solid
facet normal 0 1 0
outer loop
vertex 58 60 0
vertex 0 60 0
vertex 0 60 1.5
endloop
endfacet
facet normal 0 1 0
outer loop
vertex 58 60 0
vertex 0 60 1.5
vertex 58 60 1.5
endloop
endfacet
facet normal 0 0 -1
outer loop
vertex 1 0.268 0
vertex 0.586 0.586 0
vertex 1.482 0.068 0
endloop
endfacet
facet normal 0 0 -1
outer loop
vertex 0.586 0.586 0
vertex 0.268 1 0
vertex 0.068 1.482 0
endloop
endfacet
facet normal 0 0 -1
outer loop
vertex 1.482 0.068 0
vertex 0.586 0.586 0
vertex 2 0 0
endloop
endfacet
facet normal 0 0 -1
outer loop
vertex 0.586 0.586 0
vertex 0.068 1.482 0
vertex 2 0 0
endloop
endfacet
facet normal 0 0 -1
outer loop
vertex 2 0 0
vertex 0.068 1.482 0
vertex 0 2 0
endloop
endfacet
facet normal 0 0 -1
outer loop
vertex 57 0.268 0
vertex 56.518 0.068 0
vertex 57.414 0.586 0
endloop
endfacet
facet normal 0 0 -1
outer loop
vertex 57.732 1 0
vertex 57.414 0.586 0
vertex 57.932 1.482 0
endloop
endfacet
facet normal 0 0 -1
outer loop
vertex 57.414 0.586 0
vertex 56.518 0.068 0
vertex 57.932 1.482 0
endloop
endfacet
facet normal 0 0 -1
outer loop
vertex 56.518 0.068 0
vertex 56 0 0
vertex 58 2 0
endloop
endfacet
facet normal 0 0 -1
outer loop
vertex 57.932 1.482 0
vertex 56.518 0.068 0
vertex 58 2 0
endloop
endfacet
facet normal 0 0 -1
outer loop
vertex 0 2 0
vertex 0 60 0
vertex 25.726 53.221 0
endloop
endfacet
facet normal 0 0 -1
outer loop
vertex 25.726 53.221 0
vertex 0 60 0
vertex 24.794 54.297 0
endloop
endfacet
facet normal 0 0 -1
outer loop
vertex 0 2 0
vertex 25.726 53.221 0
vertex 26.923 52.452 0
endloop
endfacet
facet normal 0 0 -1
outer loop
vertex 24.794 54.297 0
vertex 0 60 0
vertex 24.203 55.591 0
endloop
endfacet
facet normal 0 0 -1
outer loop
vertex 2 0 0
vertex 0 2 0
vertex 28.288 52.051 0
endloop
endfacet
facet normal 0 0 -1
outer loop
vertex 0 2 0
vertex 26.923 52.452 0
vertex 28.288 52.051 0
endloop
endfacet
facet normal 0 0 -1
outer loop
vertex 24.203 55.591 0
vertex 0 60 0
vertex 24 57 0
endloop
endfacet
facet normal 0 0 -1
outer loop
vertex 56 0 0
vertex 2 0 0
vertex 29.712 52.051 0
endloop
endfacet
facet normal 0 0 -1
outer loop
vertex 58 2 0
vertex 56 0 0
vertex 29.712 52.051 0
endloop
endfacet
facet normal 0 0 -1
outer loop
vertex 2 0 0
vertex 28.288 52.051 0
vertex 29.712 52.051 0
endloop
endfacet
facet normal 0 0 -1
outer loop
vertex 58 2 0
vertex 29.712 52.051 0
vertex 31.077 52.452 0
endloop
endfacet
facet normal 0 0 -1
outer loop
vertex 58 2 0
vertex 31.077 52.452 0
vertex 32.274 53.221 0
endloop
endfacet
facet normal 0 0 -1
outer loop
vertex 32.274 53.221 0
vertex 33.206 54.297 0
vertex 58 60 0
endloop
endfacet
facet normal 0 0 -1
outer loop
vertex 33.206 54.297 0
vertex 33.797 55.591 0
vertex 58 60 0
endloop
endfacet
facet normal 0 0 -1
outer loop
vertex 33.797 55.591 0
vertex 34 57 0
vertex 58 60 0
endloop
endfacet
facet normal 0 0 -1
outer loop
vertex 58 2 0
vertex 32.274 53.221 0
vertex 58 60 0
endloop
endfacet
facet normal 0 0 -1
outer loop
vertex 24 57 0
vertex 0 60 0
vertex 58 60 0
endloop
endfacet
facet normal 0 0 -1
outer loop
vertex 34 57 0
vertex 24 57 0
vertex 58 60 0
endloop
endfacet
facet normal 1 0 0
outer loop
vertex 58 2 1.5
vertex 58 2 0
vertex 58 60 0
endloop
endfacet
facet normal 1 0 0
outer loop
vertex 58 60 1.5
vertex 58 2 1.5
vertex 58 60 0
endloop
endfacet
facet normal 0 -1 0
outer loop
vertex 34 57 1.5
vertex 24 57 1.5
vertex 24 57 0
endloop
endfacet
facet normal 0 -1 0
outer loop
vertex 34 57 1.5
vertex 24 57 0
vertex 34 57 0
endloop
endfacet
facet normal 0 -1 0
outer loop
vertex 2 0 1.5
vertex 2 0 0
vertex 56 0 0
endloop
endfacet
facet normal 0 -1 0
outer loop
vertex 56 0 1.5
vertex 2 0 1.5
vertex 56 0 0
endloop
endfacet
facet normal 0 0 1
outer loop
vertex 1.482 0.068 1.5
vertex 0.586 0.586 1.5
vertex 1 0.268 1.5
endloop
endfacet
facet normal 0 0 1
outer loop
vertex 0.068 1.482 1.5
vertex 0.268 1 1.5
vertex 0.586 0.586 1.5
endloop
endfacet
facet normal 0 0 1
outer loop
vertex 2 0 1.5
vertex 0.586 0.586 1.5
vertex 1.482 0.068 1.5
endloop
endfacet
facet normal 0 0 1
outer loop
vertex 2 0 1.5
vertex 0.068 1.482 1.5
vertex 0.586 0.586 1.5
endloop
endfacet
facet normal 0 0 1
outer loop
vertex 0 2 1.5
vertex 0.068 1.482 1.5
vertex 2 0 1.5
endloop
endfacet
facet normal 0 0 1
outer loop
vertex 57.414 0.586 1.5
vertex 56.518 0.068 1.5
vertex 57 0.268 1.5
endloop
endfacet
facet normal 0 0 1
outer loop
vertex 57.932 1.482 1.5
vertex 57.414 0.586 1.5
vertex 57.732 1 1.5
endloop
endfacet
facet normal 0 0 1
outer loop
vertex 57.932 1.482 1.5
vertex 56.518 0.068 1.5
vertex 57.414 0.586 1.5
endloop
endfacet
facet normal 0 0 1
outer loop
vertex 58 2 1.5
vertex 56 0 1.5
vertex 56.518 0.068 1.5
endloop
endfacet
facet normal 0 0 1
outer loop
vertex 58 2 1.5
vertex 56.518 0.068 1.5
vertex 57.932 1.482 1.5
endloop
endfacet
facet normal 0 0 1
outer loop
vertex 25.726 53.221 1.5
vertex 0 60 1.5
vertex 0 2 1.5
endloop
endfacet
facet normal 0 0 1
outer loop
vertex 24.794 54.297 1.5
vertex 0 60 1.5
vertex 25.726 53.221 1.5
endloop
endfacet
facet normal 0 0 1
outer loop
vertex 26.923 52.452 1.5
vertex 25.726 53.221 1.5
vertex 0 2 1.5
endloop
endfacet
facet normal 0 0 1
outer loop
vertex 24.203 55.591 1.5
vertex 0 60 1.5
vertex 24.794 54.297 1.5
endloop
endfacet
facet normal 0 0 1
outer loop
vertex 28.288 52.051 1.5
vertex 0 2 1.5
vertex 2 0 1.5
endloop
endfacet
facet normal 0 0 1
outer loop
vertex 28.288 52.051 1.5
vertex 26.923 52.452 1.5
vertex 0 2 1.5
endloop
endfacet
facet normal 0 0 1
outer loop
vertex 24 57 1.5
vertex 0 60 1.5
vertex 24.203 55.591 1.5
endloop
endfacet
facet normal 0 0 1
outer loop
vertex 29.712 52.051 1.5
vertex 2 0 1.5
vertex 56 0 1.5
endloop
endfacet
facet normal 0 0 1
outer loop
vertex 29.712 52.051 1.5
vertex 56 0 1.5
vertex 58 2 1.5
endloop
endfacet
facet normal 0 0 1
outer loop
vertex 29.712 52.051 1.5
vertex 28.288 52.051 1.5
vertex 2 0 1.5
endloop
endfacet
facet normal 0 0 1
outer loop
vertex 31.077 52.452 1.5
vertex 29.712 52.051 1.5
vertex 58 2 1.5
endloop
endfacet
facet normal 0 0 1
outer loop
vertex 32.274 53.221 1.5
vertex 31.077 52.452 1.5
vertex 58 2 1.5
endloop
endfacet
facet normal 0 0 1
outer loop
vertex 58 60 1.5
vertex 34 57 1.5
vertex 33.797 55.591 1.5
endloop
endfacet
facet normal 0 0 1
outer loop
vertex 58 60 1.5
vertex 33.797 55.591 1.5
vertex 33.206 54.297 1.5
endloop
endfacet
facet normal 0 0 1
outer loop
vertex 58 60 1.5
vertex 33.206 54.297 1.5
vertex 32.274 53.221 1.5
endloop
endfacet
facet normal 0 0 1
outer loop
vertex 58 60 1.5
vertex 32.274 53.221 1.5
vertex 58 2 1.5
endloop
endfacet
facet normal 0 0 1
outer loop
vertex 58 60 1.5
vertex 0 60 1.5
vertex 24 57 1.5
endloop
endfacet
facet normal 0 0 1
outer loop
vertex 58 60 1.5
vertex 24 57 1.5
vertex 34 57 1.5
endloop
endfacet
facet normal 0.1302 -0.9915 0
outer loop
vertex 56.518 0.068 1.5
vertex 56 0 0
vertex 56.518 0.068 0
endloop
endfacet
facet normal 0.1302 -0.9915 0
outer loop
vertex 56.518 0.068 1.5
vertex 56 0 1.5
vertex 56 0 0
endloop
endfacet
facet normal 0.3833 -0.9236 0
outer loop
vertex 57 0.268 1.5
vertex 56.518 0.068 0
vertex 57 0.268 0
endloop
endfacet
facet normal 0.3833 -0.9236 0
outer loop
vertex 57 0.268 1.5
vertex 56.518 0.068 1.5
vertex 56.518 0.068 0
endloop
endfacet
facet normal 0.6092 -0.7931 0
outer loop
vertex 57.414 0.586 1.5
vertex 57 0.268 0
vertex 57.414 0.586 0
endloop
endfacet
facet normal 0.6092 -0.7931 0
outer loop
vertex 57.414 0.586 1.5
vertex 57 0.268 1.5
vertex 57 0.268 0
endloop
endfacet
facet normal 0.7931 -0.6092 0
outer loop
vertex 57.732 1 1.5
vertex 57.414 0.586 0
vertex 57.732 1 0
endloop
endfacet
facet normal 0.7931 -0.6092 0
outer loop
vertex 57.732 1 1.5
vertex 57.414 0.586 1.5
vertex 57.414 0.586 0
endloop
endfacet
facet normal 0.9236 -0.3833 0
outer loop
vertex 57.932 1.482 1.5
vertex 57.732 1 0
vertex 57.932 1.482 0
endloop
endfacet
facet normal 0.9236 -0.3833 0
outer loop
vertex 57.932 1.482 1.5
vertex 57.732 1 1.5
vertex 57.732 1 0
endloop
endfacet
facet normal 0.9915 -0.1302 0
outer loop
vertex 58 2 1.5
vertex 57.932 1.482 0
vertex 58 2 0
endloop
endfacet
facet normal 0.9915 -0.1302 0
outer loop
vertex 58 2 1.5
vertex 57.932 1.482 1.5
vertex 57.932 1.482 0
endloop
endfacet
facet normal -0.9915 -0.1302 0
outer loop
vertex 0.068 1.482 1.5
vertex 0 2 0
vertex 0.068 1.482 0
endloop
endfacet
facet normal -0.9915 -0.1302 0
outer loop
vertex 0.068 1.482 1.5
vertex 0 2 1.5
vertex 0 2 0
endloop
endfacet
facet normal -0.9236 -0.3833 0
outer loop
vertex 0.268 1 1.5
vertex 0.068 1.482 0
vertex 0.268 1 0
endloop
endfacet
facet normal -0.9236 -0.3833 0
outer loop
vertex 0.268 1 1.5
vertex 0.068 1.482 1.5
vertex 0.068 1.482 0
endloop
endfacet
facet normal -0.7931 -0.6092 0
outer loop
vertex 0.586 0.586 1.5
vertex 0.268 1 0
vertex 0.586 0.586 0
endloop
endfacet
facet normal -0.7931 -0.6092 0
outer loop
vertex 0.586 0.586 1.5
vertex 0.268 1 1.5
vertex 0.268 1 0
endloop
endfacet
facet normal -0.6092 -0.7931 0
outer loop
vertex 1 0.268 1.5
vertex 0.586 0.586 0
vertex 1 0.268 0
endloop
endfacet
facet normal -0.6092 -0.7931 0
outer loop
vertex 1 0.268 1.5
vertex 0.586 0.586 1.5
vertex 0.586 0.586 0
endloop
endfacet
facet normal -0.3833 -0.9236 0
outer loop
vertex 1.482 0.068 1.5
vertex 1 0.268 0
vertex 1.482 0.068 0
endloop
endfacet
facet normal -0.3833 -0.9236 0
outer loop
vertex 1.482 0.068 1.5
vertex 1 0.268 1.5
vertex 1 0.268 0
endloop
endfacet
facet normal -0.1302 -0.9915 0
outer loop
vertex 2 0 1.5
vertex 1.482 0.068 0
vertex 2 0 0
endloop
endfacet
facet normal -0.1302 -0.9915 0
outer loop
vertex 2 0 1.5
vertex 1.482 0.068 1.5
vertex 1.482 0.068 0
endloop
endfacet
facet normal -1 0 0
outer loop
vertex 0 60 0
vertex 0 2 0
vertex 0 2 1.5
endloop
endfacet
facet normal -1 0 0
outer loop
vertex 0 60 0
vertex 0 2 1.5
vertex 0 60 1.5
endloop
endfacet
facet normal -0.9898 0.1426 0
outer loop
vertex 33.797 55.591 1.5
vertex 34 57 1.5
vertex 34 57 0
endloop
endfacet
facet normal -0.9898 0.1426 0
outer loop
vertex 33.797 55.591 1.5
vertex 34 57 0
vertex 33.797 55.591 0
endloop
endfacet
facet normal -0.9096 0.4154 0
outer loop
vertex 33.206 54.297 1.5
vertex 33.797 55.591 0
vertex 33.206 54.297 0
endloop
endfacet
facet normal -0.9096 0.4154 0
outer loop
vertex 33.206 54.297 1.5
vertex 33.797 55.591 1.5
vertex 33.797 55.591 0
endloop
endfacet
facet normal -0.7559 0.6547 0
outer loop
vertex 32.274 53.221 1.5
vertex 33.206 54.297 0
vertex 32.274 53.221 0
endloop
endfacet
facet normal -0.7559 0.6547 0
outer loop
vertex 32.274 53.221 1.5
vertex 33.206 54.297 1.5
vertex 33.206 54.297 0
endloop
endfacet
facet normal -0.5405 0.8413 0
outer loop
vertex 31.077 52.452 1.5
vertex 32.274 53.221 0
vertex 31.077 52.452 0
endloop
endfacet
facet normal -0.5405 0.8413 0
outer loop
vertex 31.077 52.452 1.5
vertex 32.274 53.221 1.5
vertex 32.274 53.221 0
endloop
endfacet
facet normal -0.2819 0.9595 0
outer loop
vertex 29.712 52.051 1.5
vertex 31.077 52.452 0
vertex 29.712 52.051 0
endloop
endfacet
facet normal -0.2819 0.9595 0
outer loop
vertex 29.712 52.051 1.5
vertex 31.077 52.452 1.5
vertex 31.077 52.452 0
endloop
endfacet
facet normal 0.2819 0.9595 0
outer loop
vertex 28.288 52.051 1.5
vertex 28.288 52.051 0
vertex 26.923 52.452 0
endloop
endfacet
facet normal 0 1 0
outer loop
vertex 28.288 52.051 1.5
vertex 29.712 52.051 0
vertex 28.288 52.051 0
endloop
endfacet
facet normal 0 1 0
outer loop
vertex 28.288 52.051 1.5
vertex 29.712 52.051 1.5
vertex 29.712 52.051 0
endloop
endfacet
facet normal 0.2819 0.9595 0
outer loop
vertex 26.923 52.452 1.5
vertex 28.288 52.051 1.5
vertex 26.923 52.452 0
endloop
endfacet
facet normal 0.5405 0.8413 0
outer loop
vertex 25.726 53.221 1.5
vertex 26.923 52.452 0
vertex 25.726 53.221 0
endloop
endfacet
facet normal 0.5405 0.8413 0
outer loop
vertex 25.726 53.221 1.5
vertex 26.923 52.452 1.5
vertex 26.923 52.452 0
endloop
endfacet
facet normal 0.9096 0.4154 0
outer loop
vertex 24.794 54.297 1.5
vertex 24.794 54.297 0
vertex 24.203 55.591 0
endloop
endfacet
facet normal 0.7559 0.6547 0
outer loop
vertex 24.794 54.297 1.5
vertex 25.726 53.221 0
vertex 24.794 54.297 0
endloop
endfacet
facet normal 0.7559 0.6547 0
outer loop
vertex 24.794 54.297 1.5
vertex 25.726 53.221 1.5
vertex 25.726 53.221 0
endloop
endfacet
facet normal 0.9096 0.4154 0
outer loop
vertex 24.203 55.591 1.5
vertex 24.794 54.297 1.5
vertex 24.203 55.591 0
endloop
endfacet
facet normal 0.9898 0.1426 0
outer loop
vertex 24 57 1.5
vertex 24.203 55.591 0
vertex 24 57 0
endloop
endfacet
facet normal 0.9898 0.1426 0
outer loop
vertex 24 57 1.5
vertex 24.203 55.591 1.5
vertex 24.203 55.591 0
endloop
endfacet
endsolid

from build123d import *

# Parameters (mm, degrees)
SKETCH_1_W          = 58
SKETCH_1_H          = 60
EXTRUDE_1_DEPTH     = 1.5
FILLET_1_R          = 2
CUT_EXTRUDE_1_DEPTH = 84.464064123


with BuildPart() as part:
    # Эскиз1 → Бобышка-Вытянуть1 (new body)
    with BuildSketch(Plane.XY):
        with Locations((29, 30)):
            Rectangle(SKETCH_1_W, SKETCH_1_H)
    extrude(amount=EXTRUDE_1_DEPTH)

    # Скругление1
    fillet_1_edges = [part.edges().sort_by_distance(p)[0] for p in [
        (58, 0, 0.75),
        (0, 0, 0.75),
    ]]
    fillet(fillet_1_edges, radius=FILLET_1_R)

    # Эскиз2 → Вырез-Вытянуть1 (cut, through all)
    with BuildSketch(Plane.XY.offset(1.5)):
        with BuildLine():
            Line((24, 57), (34, 57))
            ThreePointArc((34, 57), (29, 52), (24, 57))
        make_face()
    extrude(amount=-CUT_EXTRUDE_1_DEPTH, mode=Mode.SUBTRACT)


solid = part.part
